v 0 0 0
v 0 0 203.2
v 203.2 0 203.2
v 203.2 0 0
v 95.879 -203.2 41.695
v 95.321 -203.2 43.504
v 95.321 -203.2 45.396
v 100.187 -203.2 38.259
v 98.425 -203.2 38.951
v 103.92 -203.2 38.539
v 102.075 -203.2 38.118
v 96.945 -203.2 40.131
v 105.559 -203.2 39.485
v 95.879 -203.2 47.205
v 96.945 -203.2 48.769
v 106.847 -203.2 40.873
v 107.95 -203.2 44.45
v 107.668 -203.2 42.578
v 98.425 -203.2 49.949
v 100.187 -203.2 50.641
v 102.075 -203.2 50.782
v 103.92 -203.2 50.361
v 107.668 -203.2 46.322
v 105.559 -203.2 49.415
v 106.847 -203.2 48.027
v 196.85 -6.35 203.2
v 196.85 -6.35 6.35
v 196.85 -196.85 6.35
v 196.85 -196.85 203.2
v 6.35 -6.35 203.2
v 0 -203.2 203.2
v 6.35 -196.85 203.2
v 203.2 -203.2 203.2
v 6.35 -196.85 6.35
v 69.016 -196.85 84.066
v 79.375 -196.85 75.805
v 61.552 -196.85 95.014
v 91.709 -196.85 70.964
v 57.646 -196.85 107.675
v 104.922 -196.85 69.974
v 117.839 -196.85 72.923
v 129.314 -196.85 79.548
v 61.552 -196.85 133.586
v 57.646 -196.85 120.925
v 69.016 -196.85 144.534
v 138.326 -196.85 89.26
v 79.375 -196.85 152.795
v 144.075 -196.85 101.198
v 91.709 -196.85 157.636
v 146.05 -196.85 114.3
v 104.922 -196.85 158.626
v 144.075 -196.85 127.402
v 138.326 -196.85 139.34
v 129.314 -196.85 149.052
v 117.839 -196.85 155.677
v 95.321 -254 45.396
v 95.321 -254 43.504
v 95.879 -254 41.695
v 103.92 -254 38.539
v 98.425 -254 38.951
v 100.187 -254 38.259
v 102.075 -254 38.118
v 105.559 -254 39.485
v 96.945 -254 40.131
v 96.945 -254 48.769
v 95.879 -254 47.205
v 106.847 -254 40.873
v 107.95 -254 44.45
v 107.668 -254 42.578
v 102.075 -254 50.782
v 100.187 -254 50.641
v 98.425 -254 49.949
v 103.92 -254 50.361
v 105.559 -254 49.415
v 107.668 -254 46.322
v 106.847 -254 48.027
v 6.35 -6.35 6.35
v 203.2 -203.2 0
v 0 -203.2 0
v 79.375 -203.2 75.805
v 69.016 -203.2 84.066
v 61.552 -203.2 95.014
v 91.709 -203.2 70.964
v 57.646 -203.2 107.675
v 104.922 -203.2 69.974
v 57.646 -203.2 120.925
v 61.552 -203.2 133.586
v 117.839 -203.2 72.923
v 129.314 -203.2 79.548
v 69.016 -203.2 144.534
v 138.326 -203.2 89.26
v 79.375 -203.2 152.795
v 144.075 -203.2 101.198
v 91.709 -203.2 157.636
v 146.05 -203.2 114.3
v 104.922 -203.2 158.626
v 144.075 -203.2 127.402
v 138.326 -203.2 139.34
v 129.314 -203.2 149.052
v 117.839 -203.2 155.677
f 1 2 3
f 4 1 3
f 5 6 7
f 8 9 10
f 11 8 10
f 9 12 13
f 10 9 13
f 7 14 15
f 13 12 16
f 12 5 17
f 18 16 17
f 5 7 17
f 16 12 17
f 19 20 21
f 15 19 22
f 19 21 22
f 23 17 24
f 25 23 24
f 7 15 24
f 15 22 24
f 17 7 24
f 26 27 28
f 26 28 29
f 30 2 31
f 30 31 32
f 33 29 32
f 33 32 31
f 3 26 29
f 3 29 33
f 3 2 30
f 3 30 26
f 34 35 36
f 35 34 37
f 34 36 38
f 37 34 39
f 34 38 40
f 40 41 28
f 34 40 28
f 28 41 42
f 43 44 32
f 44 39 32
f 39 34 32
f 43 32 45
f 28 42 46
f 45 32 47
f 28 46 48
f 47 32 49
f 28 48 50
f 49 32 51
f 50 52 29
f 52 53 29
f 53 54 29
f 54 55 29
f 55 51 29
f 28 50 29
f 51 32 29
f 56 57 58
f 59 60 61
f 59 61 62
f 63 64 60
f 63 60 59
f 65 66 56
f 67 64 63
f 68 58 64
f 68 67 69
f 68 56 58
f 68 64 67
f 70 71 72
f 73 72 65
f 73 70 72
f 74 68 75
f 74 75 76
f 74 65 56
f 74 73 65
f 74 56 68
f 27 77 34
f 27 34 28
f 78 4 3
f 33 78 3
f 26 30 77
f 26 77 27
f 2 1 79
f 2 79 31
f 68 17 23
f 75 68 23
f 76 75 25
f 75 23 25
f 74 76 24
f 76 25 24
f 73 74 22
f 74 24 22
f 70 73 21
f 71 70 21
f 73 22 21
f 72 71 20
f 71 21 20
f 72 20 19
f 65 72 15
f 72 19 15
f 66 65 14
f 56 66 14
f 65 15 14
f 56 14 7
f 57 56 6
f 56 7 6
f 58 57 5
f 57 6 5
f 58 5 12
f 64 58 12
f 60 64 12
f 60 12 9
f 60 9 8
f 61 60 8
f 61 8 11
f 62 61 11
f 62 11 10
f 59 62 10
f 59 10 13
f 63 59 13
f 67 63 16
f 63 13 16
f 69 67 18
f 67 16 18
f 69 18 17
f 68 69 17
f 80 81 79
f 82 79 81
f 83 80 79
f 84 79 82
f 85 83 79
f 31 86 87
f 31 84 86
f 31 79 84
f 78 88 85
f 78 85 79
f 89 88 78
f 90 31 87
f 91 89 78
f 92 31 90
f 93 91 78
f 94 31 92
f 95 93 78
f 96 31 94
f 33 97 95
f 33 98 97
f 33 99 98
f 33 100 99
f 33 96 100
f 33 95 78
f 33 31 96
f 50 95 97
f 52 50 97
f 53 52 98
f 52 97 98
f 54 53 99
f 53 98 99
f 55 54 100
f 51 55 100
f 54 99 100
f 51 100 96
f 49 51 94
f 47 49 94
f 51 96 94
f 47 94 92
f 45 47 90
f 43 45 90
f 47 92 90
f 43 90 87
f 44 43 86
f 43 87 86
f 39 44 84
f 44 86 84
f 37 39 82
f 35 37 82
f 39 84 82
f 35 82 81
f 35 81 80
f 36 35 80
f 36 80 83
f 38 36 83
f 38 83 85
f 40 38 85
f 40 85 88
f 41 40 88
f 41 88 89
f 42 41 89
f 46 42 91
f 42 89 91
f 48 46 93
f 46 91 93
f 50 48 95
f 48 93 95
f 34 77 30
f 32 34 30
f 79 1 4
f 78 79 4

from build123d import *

# Parameters (mm, degrees)
F0_W     = 203.2
F0_H     = 203.2
F1_DEPTH = 203.2
F2_T     = -6.35
F3_R     = 44.45
F4_DEPTH = 6.35
F5_R     = 6.35
F6_DEPTH = 50.8


with BuildPart() as f1:
    # F0 (on Front) → F1 (new body)
    with BuildSketch(Plane.XZ):
        with Locations((101.6, 101.6)):
            Rectangle(F0_W, F0_H)
    extrude(amount=F1_DEPTH)

    # F2
    f2_openings = [f1.faces().sort_by_distance(p)[0] for p in [
        (101.6, -101.6, 203.2),
    ]]
    offset(amount=F2_T, openings=f2_openings)

    # F3 (on face) → F4 (cut)
    with BuildSketch(Plane.XZ.offset(203.2)):
        with Locations((101.6, 114.3)):
            Circle(F3_R)
    extrude(amount=-F4_DEPTH, mode=Mode.SUBTRACT)


with BuildPart() as f6:
    # F5 (on face) → F6 (new body)
    with BuildSketch(Plane.XZ.offset(203.2)):
        with Locations((101.6, 44.45)):
            Circle(F5_R)
    extrude(amount=F6_DEPTH)


solid = Compound([f1.part, f6.part])
